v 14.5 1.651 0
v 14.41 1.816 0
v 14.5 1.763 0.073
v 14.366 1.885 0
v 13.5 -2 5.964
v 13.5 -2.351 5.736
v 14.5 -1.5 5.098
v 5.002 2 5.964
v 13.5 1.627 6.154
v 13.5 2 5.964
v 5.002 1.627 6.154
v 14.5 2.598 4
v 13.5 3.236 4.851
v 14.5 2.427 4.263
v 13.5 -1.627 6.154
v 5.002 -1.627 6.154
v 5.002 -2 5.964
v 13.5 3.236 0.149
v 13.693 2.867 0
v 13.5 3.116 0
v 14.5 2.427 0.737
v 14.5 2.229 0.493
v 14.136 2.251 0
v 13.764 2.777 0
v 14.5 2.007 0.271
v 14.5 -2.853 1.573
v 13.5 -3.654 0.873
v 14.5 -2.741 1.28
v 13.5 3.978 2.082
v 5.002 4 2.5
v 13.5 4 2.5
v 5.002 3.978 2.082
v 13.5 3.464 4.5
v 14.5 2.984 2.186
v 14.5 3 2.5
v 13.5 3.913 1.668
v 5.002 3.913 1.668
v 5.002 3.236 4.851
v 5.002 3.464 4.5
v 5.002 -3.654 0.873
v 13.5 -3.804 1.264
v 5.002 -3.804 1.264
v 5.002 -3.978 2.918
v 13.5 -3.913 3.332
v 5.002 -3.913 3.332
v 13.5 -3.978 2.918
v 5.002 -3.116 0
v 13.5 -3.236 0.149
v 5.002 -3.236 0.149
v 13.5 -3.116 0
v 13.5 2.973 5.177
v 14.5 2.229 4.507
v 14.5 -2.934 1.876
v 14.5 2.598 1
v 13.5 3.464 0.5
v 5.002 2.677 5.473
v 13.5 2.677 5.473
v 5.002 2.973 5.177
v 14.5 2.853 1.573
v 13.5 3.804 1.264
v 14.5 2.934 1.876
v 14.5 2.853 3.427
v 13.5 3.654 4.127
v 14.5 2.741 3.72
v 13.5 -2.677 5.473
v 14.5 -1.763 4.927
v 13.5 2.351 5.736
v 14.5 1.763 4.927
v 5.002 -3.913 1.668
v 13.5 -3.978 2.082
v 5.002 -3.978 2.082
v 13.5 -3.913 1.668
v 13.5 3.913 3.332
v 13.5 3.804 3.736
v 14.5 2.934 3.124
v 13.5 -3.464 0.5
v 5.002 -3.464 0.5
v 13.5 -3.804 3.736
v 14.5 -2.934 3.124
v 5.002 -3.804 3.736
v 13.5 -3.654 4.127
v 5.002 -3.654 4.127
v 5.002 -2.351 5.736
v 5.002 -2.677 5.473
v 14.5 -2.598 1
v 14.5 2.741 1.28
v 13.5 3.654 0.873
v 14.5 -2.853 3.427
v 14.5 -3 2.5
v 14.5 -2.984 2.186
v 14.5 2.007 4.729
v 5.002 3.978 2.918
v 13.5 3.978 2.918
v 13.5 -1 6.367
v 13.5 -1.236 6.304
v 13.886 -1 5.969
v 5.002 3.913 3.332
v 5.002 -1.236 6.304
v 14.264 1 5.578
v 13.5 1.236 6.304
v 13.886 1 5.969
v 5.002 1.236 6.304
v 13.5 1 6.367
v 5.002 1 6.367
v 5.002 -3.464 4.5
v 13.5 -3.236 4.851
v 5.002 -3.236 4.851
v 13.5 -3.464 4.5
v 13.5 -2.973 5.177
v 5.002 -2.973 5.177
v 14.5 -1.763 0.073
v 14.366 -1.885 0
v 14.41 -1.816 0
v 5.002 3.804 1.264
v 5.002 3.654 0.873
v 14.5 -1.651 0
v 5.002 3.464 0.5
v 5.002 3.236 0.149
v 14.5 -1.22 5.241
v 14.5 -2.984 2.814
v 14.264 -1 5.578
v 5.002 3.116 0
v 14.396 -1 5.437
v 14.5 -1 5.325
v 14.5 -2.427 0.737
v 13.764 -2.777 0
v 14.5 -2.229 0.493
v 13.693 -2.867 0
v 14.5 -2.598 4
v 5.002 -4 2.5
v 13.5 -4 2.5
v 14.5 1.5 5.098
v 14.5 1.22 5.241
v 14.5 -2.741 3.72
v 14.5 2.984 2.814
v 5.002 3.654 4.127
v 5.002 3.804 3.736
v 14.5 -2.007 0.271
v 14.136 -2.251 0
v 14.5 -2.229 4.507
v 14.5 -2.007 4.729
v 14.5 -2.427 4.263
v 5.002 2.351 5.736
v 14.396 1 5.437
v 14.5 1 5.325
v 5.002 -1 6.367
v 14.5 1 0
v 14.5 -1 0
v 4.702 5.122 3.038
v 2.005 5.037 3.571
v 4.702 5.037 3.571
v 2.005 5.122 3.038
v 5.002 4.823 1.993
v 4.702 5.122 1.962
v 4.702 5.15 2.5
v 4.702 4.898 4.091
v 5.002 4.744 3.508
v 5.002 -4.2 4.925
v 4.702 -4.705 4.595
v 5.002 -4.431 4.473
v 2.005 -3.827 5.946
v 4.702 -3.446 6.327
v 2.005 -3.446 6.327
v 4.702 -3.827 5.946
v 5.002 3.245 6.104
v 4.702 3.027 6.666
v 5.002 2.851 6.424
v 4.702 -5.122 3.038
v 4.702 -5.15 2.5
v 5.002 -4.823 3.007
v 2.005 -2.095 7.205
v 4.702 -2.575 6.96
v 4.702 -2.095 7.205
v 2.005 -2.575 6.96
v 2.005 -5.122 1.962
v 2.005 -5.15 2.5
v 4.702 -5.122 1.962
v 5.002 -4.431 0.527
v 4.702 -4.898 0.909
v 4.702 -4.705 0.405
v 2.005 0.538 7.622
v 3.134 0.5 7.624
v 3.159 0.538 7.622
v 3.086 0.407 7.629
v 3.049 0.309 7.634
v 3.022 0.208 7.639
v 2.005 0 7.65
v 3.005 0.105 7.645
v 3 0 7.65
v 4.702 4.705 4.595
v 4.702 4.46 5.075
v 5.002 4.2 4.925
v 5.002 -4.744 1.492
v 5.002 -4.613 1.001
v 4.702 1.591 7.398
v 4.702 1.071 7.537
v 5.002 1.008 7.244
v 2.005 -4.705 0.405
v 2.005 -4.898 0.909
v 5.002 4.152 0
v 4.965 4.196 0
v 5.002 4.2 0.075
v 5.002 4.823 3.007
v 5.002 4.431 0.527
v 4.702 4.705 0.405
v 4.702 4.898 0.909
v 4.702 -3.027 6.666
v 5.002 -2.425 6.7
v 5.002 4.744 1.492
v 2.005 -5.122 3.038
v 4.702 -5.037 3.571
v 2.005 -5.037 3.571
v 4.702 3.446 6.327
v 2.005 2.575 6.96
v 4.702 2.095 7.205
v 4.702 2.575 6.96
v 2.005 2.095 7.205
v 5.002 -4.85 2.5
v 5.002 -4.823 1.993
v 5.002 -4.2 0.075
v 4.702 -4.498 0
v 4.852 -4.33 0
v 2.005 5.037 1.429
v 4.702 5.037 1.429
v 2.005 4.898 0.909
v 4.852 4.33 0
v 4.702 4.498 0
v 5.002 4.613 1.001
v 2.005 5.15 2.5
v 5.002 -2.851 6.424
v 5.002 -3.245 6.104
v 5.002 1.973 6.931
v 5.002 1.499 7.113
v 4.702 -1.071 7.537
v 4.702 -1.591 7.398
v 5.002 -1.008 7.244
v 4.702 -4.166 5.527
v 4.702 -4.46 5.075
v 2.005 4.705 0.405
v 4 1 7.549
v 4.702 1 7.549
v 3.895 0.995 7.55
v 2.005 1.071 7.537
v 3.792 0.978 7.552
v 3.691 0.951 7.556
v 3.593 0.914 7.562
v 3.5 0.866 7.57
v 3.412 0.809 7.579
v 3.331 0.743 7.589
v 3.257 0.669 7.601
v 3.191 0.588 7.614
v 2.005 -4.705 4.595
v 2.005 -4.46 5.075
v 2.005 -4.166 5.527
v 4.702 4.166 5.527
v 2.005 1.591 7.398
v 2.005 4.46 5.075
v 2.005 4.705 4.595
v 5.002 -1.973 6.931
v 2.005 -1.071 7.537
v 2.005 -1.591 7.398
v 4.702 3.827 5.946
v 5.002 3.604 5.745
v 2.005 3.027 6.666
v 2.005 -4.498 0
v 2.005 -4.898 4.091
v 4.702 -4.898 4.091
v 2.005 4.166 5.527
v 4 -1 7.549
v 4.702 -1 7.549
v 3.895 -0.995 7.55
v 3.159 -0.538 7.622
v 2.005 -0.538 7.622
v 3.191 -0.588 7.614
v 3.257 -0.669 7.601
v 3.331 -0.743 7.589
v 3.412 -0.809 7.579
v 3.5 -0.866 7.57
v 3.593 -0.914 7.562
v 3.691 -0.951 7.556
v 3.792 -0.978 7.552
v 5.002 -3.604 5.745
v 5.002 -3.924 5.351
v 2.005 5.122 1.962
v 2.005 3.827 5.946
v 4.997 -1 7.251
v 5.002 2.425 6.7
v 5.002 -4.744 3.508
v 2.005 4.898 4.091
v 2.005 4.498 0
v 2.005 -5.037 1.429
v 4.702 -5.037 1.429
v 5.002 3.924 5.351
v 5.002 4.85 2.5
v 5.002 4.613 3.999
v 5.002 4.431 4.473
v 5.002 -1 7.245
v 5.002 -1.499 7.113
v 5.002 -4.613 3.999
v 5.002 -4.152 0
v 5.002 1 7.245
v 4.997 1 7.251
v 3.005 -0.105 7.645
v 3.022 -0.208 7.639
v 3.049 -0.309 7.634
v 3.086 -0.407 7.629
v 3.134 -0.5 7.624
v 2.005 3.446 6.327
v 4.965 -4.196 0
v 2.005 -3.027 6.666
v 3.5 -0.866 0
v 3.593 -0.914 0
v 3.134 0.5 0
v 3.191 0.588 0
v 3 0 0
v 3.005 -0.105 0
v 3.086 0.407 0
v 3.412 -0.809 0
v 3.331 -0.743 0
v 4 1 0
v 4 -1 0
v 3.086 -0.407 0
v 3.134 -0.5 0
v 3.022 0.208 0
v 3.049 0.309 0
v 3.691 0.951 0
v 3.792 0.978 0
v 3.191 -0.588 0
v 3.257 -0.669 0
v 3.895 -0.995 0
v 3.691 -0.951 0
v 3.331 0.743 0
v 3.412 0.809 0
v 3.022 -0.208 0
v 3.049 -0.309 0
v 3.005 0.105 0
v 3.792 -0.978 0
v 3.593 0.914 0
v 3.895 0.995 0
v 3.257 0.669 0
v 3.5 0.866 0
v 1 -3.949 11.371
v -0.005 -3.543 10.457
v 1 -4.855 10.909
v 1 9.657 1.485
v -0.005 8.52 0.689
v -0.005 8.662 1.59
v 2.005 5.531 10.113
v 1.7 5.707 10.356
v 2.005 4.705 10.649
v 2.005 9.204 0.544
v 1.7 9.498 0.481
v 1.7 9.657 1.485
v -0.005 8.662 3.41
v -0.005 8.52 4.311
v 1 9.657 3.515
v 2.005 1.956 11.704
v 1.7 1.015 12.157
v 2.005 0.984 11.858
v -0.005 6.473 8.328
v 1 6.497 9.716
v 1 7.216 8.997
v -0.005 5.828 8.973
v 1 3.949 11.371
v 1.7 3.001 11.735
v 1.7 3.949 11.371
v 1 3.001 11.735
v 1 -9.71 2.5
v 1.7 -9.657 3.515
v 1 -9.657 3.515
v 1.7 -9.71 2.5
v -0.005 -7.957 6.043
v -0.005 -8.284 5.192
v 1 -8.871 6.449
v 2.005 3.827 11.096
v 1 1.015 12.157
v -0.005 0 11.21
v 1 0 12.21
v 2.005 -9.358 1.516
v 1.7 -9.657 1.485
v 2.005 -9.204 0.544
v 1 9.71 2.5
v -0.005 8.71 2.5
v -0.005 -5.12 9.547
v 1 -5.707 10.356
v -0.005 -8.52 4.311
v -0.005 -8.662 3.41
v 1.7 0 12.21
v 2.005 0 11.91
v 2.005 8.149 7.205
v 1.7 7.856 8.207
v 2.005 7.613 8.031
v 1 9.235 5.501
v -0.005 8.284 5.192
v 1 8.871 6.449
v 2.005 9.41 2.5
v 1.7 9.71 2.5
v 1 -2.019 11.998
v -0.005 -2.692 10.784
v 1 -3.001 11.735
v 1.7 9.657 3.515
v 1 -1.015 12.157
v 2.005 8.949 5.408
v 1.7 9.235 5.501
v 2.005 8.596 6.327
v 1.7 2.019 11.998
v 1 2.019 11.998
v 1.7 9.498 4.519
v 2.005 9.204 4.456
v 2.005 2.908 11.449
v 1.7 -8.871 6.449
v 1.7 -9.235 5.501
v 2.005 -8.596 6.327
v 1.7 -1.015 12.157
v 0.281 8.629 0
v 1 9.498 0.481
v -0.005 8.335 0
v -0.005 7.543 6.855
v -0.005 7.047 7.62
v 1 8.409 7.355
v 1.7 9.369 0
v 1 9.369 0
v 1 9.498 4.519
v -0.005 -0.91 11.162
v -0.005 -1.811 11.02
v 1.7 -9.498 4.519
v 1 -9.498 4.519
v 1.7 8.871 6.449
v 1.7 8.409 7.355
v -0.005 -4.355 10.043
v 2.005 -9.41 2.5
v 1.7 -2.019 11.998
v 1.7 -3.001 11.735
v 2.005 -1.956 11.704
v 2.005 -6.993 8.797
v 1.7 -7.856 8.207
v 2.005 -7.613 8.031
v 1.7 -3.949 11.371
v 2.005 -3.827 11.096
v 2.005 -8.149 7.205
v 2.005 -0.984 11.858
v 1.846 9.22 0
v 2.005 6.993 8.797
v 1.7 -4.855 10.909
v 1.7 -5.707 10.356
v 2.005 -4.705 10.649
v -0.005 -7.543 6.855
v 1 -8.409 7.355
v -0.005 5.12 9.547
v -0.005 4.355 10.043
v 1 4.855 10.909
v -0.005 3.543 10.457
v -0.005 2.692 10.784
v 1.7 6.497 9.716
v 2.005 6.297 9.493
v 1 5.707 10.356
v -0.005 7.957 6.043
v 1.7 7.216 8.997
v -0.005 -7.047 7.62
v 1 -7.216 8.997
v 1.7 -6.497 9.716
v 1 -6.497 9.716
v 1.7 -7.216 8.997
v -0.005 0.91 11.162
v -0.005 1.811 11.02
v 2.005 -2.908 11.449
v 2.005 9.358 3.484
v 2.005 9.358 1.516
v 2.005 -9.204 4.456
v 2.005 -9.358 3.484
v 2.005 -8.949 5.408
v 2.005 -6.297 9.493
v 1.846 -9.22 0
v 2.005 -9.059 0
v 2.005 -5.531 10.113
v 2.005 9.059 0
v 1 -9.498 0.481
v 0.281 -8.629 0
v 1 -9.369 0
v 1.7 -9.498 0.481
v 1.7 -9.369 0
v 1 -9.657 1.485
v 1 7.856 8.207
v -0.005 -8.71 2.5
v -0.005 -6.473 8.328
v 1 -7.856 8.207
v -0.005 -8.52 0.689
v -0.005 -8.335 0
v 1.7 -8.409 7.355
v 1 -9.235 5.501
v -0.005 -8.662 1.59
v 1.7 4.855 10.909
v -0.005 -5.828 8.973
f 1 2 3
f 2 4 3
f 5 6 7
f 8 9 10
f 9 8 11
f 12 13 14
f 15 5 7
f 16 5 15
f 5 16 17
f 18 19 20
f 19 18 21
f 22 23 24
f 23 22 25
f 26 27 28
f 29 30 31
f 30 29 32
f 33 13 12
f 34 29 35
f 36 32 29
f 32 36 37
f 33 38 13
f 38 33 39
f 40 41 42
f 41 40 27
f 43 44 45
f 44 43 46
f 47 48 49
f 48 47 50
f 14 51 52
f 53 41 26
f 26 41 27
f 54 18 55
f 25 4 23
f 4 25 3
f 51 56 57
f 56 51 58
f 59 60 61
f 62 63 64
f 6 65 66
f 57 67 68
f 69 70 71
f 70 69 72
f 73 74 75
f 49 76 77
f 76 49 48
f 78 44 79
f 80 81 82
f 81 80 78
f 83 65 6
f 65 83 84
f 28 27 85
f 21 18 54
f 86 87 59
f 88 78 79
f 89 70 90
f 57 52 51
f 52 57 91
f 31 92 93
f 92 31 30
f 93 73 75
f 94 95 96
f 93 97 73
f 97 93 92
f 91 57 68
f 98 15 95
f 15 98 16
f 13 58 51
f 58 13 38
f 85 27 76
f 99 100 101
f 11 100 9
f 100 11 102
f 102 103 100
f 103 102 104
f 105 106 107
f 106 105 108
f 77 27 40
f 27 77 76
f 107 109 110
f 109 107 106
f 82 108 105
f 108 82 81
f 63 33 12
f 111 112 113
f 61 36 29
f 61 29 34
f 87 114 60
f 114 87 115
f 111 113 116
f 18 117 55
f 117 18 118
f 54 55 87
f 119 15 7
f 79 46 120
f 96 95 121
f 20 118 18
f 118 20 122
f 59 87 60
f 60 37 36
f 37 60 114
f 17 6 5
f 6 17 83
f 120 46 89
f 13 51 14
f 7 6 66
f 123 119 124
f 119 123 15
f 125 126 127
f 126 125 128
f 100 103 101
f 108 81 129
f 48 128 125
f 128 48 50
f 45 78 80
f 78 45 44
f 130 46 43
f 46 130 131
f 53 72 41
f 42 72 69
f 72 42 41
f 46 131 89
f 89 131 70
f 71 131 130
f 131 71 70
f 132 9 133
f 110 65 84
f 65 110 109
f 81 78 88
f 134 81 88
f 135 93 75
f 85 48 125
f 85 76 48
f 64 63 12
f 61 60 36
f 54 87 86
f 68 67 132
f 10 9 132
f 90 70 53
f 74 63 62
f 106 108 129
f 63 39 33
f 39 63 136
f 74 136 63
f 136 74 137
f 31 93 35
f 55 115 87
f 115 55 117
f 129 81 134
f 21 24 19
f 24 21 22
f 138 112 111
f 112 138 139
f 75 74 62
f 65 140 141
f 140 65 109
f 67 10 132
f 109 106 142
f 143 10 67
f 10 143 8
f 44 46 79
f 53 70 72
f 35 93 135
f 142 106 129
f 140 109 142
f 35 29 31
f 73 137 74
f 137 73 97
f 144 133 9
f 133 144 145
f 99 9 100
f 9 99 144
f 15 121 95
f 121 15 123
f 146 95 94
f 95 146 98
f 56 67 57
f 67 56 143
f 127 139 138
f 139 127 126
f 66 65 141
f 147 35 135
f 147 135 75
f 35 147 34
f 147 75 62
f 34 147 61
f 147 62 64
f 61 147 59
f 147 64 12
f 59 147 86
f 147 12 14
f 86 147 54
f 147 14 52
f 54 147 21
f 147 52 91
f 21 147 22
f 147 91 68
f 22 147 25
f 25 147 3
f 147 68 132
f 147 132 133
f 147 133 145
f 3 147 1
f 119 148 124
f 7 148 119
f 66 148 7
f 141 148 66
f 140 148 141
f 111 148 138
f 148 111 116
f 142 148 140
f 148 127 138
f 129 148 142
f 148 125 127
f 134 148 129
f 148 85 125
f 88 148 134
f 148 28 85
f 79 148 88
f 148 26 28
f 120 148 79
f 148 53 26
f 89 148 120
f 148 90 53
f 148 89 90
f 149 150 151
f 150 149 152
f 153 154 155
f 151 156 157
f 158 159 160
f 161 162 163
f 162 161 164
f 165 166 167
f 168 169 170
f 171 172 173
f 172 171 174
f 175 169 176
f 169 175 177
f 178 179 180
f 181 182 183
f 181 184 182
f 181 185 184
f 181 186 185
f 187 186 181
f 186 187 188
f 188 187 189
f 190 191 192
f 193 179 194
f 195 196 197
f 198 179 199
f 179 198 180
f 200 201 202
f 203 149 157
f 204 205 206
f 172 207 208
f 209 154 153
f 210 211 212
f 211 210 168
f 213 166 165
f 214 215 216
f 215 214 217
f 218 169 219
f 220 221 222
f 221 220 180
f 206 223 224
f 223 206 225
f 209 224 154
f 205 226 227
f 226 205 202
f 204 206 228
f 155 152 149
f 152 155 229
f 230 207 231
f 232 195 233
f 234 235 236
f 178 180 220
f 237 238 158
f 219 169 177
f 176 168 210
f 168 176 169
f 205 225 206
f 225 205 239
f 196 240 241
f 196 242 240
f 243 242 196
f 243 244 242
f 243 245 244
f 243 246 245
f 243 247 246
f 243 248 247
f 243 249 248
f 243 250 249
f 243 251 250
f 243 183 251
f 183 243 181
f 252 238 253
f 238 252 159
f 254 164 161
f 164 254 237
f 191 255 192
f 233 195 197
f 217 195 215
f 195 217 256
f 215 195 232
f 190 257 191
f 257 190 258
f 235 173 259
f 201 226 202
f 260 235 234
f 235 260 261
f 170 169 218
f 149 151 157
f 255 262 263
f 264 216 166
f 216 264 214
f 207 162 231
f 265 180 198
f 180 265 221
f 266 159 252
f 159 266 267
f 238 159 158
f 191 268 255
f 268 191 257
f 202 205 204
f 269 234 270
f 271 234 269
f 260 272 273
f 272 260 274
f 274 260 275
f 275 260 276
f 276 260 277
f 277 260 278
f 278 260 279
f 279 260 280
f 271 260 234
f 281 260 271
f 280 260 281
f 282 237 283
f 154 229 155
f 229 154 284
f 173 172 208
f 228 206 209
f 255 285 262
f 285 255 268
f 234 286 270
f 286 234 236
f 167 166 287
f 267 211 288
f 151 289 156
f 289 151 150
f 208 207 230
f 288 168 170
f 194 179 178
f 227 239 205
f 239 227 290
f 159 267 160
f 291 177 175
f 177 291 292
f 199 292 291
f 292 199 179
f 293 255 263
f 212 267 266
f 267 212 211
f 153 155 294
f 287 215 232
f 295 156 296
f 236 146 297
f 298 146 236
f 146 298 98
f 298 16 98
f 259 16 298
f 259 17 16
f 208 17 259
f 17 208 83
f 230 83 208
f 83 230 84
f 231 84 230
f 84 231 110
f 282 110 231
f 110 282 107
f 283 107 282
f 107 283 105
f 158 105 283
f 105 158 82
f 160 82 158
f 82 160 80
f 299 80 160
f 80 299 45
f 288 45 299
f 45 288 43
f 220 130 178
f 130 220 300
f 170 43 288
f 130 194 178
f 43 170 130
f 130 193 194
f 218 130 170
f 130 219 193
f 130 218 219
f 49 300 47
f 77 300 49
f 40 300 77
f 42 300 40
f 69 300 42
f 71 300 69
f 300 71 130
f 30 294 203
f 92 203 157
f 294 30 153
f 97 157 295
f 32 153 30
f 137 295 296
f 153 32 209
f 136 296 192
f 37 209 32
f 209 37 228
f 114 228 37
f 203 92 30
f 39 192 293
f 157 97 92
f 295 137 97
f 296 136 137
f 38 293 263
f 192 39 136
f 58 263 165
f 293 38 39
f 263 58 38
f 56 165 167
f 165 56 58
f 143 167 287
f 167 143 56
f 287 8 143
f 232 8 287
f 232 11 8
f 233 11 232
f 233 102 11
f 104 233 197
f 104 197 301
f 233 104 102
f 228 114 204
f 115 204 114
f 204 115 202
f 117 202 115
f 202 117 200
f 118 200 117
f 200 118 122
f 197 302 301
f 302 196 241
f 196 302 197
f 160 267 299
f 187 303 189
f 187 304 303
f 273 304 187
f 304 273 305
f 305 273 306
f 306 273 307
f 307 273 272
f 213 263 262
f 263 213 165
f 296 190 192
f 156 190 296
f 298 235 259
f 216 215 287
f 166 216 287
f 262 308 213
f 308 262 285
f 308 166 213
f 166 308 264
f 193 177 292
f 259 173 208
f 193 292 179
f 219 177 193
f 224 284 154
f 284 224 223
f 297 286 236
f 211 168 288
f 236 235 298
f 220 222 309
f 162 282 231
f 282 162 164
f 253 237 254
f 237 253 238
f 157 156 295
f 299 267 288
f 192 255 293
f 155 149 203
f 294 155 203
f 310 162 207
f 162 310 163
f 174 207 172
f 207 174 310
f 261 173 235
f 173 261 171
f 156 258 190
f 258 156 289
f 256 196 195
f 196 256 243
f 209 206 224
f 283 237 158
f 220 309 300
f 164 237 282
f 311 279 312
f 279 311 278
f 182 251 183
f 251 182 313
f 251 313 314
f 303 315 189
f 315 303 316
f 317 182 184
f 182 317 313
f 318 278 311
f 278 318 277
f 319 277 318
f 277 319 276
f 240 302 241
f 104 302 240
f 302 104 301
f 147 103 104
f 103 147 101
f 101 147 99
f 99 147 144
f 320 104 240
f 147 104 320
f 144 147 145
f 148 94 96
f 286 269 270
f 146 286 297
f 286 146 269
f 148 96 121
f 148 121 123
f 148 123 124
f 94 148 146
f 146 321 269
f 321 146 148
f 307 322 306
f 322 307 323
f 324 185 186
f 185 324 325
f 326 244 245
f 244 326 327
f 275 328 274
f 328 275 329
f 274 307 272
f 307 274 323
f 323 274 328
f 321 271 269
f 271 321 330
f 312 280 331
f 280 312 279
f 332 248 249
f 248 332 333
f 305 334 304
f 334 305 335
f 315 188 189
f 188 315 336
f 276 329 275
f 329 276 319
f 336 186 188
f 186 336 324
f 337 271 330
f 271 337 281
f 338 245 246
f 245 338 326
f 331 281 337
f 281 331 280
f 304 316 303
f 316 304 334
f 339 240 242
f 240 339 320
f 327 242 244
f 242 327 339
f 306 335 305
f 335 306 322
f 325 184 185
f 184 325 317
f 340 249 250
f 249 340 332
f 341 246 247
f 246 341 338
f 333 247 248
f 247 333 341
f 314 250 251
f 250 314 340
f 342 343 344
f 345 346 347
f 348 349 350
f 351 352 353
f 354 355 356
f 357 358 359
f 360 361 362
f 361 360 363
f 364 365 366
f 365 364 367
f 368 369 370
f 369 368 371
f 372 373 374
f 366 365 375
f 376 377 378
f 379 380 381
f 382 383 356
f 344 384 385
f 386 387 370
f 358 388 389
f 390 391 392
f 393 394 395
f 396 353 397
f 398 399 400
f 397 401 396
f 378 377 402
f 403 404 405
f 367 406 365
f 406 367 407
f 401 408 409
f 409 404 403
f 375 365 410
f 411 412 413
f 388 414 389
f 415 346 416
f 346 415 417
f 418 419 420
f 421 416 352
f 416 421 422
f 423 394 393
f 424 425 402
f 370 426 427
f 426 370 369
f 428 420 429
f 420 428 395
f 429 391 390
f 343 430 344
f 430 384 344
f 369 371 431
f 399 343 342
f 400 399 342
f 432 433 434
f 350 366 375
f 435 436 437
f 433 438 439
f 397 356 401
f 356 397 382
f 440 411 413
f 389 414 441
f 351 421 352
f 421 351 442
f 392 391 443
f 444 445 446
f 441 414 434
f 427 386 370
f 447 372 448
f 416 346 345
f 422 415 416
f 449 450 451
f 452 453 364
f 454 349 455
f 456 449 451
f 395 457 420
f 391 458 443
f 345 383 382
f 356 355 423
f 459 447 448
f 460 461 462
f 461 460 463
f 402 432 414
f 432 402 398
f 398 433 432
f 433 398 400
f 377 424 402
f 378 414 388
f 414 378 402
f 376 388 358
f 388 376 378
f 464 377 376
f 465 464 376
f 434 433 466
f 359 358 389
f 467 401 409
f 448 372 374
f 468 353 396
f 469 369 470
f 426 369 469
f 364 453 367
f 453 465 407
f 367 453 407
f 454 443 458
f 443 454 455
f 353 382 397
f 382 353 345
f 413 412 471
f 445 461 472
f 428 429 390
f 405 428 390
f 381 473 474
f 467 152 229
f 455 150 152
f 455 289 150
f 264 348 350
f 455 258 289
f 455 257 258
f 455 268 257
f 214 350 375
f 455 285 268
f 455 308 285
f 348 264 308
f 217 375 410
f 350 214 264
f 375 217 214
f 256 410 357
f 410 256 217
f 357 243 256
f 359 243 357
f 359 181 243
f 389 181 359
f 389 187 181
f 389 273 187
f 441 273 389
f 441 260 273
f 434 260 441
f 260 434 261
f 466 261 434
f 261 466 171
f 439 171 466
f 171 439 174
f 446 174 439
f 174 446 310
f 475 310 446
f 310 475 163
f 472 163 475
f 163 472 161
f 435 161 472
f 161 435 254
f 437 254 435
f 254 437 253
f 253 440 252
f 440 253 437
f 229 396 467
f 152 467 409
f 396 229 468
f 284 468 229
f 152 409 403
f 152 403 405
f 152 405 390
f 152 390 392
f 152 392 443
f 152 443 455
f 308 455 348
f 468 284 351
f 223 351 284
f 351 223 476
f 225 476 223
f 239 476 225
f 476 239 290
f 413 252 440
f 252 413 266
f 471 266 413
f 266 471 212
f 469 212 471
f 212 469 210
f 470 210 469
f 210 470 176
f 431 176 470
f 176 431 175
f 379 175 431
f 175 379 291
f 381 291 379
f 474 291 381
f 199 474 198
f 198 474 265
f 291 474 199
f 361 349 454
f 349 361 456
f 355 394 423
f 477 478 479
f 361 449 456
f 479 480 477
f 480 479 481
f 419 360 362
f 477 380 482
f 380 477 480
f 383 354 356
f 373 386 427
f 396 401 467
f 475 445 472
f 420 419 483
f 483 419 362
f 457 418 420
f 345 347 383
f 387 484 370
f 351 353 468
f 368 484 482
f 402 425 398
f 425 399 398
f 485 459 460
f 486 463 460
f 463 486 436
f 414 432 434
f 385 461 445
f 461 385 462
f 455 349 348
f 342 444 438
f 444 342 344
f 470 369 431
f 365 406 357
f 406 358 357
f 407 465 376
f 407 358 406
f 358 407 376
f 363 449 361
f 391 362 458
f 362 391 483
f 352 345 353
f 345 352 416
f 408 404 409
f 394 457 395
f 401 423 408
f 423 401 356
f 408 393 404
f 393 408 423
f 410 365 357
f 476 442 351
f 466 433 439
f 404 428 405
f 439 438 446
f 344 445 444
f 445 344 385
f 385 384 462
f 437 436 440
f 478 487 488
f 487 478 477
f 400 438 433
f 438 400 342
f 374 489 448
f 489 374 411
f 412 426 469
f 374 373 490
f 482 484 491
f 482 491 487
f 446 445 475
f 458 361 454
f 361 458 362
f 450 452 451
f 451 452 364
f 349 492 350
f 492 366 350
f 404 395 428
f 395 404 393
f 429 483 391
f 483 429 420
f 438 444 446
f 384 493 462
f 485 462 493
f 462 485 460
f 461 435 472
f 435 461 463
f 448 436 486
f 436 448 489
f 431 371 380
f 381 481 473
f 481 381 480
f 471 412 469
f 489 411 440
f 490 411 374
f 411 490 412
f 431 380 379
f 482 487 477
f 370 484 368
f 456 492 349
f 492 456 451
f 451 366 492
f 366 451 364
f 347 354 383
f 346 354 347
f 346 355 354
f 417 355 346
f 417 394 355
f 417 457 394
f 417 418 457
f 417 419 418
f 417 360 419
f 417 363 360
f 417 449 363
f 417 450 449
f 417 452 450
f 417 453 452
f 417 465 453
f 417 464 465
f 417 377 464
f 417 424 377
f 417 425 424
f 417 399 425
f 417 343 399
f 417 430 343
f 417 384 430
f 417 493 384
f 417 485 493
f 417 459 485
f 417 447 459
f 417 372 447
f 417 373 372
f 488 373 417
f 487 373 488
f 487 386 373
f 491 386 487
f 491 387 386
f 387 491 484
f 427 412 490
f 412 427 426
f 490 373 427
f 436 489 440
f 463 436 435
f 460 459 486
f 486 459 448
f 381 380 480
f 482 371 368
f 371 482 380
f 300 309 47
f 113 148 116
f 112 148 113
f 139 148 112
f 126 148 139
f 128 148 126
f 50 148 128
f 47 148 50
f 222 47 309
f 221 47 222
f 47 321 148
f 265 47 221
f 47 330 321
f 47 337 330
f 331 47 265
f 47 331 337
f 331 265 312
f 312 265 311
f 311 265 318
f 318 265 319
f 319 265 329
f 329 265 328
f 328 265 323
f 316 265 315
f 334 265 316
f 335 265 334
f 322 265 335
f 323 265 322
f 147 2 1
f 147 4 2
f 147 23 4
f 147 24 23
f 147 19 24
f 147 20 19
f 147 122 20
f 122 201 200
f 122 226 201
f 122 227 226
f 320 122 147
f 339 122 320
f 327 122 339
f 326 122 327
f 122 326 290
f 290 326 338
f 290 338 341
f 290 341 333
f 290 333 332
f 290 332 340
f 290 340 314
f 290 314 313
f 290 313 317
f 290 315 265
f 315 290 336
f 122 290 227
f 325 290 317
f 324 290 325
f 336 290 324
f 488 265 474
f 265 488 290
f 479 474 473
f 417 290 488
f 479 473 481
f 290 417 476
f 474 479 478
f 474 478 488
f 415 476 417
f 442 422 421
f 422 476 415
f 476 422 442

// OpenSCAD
$fn=60;


topOutterDiamiter=19.42;
topInnerSize=19.5;
topHeigth=.35;

pinCenterHeigth=14.5;
pinCenterDiamiter=8;

pinSholderHeigth=5.002;
pinSholderDiamiter=10.3;

difference(){
  translate([0,0,2.5])
  rotate([0,90,0])
    pinWhole();

  translate([0,0,-25])
  cube([50,50,50],center=true);
}
////////////////////////////////////////////////////////////////////////////////
module pinWhole(){
  pinMod();
  top();  
}
////////////////////////////////////////////////////////////////////////////////
module pinMod(){
  difference(){
    union(){
      centerPin();
      sholderPin();
    }
    hull(){
      translate([0,0,4])
        rotate([0,90,0])
        cylinder(h=topOutterDiamiter,d=2,center=true);

      translate([0,0,pinCenterHeigth])
        rotate([0,90,0])
        cylinder(h=topOutterDiamiter,d=2,center=true);
    }
    translate([0,0,(-pinCenterHeigth/2)-1])
      cylinder(h=topOutterDiamiter,d=topOutterDiamiter+.2,center=true);
  }
}
////////////////////////////////////////////////////////////////////////////////
module centerPin(){
color("orange")
  hull(){
    cylinder(h=pinCenterHeigth*2,d=pinCenterDiamiter-2,center=true);    // Inner
    cylinder(h=(pinCenterHeigth*2)-2,d=pinCenterDiamiter,center=true);  // Outter
  }
}
////////////////////////////////////////////////////////////////////////////////
module sholderPin(){
color("red")
  hull(){
    cylinder(h=pinSholderHeigth*2,d=pinSholderDiamiter-.6,center=true);    // Inner
    cylinder(h=(pinSholderHeigth*2)-.6,d=pinSholderDiamiter,center=true);  // Outter
  }
}
////////////////////////////////////////////////////////////////////////////////
module top(){
  translate([0,0,1+topHeigth])
    color("CadetBlue")
    hull(){
      cylinder(h=topHeigth*2,d=topOutterDiamiter,center=true);  // Outter

      translate([0,0,.65])
      cylinder(h=.01,d=topOutterDiamiter-.6,center=true);  // Inner Bottom

      translate([0,0,-1-topHeigth])
      cylinder(h=.01,d=topOutterDiamiter-2,center=true);  // Inner Top
    }
}
